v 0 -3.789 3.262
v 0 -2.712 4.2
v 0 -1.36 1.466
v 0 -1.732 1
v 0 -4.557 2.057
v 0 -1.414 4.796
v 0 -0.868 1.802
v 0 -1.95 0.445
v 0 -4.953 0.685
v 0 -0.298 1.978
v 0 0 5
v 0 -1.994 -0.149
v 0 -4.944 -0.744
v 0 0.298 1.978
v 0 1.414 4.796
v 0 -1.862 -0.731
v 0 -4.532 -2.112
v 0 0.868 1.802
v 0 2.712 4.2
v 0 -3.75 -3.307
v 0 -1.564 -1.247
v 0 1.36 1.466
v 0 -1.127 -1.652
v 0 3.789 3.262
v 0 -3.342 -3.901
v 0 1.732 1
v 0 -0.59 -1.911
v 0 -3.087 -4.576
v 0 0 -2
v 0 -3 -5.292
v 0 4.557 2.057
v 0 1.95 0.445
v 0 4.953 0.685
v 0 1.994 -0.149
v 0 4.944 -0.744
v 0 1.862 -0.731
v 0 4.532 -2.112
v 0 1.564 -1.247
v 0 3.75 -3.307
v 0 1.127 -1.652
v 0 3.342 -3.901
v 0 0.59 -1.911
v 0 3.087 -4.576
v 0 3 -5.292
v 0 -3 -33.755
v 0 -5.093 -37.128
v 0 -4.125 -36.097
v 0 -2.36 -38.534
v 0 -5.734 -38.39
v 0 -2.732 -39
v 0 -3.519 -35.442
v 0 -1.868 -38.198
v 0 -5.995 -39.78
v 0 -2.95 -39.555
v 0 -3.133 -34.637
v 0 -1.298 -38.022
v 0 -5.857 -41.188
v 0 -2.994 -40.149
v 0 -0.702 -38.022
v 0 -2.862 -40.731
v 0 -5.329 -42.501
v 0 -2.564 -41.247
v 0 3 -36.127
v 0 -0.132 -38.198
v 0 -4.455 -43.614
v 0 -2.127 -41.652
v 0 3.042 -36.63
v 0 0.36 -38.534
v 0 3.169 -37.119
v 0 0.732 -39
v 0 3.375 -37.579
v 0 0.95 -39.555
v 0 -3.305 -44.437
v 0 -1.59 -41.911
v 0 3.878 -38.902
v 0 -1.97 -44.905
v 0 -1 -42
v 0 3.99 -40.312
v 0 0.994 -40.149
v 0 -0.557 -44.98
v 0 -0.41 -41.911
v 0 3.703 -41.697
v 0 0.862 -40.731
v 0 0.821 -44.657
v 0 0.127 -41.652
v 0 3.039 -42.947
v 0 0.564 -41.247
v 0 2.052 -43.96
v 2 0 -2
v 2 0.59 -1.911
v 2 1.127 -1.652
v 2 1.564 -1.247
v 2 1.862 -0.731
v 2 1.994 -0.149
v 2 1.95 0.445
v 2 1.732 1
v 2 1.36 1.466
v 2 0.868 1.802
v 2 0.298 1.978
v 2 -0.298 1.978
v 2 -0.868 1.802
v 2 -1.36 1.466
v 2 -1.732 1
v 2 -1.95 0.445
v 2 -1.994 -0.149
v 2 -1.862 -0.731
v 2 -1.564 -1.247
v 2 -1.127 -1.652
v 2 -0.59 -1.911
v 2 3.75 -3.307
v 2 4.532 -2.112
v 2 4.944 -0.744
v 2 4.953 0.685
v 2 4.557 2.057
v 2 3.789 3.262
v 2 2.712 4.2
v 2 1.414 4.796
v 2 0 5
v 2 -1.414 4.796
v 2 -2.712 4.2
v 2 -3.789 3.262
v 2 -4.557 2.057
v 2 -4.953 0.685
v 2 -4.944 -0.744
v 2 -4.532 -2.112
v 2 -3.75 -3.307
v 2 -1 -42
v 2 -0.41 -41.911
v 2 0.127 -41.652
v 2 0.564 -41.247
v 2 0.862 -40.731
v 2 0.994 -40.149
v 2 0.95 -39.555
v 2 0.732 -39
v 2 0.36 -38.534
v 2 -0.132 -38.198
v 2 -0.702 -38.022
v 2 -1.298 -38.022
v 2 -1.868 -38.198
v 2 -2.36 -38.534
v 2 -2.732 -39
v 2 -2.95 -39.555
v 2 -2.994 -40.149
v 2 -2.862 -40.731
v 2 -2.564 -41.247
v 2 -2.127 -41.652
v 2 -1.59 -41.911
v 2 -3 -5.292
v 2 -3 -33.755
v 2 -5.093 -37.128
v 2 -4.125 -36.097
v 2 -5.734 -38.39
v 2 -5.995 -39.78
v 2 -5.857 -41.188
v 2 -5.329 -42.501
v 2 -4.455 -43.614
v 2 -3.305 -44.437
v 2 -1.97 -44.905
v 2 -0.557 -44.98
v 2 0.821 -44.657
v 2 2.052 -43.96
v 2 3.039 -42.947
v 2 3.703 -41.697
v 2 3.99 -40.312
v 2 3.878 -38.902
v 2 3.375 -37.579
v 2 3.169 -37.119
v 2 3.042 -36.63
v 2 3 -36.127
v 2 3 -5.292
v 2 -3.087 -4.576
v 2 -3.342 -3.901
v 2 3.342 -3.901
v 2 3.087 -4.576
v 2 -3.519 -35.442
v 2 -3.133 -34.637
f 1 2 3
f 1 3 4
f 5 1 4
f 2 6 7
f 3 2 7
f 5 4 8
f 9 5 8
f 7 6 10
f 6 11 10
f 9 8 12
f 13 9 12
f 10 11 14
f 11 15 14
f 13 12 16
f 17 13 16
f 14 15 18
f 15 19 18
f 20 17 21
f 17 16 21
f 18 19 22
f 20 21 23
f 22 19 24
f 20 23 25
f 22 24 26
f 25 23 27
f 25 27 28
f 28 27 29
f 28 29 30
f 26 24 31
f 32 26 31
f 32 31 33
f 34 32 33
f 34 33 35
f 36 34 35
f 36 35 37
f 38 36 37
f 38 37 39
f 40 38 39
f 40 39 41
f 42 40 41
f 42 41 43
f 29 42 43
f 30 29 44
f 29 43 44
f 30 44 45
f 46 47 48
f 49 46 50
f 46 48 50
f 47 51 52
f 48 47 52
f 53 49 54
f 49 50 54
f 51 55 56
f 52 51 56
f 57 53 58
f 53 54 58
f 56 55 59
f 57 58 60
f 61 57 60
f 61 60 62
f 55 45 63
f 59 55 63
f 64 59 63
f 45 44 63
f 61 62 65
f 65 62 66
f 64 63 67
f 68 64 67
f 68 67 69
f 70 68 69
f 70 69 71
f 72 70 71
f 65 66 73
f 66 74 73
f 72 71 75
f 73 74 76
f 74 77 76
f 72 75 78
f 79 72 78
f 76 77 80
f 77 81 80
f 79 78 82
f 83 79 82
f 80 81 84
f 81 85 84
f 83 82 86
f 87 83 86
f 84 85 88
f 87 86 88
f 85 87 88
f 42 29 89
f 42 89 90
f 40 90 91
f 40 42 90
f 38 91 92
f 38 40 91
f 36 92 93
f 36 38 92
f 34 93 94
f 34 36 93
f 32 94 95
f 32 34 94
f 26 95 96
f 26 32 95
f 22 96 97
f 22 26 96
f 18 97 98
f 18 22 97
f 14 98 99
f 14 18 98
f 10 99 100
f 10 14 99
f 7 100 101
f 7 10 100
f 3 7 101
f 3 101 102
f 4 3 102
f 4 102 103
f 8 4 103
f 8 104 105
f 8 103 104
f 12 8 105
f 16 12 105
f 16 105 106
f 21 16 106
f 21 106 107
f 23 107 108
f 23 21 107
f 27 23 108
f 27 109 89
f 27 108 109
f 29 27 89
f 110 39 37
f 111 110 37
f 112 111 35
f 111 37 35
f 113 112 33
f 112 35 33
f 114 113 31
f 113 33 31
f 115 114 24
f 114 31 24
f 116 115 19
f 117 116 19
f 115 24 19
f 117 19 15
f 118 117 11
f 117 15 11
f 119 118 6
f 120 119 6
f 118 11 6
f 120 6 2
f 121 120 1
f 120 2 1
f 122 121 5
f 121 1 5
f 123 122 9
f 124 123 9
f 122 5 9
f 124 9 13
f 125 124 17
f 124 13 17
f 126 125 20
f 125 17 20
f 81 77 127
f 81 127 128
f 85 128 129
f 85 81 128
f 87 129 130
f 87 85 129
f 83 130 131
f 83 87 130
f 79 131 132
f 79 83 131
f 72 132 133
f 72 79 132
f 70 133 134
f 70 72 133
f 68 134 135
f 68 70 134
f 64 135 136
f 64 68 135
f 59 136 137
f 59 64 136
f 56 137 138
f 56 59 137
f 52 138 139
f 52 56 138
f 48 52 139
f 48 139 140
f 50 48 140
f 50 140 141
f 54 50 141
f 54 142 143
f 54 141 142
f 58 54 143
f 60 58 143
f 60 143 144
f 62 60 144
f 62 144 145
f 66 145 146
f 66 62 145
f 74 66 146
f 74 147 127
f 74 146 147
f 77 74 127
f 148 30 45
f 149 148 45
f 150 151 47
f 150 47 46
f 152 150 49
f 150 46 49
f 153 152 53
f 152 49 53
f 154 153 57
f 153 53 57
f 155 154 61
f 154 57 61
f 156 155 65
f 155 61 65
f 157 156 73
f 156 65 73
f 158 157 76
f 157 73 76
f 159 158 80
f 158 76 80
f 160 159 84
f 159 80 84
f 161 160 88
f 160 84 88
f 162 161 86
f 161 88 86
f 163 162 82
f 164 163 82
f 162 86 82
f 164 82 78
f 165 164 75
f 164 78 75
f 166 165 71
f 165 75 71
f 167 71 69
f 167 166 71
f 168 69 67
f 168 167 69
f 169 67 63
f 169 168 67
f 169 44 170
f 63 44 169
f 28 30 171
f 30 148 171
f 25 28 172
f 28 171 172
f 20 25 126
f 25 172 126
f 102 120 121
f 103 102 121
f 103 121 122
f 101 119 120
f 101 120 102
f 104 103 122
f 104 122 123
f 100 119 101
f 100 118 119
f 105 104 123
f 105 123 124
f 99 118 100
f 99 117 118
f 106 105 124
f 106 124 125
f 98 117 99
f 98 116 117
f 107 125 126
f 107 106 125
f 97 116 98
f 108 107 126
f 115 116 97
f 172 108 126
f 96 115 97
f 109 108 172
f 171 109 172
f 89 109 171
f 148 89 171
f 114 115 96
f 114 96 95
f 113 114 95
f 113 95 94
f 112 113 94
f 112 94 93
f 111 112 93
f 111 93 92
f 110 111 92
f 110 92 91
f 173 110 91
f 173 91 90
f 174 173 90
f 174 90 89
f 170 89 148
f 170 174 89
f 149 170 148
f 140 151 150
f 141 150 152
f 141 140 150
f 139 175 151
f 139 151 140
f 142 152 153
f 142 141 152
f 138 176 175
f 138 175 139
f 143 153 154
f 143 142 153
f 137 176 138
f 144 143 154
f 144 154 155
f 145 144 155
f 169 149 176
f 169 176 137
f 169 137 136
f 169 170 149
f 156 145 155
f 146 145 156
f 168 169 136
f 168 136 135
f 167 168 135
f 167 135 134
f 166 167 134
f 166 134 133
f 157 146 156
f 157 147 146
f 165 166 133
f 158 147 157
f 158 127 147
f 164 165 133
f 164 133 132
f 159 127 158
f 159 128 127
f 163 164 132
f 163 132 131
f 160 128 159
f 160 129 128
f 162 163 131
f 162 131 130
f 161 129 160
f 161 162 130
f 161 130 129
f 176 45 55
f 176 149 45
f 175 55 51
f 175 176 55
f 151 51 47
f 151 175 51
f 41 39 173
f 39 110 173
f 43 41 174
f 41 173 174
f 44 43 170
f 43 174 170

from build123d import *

# Parameters (mm, degrees)
SKETCH_1_R               = 5
SKETCH_1_W               = 40
SKETCH_1_H               = 6
EXTRUDE_1_DEPTH          = 2
CUT_EXTRUDE_2_DEPTH      = 46.44227107
CUT_EXTRUDE_2_DEPTH_BACK = 46.44227107
SKETCH_1_3_R             = 2
FILLET_1_R               = 3


with BuildPart() as part:
    # 草图1 → 凸台-拉伸1 (new body)
    with BuildSketch(Plane(origin=(0, 0, 0), x_dir=(0, 0, -1), z_dir=(1, 0, 0))):
        Circle(SKETCH_1_R)
        with Locations((40, -1)):
            Circle(SKETCH_1_R)
        with Locations((20, 0)):
            Rectangle(SKETCH_1_W, SKETCH_1_H)
    extrude(amount=EXTRUDE_1_DEPTH)

    # 草图1<3> → 切除-拉伸2 (cut, two sides: drawn at the far end of the back side and taken through both)
    with BuildSketch(Plane(origin=(0, 0, 0), x_dir=(0, 0, -1), z_dir=(1, 0, 0)).offset(-CUT_EXTRUDE_2_DEPTH_BACK)):
        Circle(SKETCH_1_3_R)
        with Locations((40, -1)):
            Circle(SKETCH_1_3_R)
    extrude(amount=CUT_EXTRUDE_2_DEPTH + CUT_EXTRUDE_2_DEPTH_BACK, mode=Mode.SUBTRACT)

    # 圆角1
    fillet_1_edges = [part.edges().sort_by_distance(p)[0] for p in [
        (1, -3, -35.417424305),
        (1, 3, -37),
        (1, 3, -4),
        (1, -3, -4),
    ]]
    fillet(fillet_1_edges, radius=FILLET_1_R)


solid = part.part
